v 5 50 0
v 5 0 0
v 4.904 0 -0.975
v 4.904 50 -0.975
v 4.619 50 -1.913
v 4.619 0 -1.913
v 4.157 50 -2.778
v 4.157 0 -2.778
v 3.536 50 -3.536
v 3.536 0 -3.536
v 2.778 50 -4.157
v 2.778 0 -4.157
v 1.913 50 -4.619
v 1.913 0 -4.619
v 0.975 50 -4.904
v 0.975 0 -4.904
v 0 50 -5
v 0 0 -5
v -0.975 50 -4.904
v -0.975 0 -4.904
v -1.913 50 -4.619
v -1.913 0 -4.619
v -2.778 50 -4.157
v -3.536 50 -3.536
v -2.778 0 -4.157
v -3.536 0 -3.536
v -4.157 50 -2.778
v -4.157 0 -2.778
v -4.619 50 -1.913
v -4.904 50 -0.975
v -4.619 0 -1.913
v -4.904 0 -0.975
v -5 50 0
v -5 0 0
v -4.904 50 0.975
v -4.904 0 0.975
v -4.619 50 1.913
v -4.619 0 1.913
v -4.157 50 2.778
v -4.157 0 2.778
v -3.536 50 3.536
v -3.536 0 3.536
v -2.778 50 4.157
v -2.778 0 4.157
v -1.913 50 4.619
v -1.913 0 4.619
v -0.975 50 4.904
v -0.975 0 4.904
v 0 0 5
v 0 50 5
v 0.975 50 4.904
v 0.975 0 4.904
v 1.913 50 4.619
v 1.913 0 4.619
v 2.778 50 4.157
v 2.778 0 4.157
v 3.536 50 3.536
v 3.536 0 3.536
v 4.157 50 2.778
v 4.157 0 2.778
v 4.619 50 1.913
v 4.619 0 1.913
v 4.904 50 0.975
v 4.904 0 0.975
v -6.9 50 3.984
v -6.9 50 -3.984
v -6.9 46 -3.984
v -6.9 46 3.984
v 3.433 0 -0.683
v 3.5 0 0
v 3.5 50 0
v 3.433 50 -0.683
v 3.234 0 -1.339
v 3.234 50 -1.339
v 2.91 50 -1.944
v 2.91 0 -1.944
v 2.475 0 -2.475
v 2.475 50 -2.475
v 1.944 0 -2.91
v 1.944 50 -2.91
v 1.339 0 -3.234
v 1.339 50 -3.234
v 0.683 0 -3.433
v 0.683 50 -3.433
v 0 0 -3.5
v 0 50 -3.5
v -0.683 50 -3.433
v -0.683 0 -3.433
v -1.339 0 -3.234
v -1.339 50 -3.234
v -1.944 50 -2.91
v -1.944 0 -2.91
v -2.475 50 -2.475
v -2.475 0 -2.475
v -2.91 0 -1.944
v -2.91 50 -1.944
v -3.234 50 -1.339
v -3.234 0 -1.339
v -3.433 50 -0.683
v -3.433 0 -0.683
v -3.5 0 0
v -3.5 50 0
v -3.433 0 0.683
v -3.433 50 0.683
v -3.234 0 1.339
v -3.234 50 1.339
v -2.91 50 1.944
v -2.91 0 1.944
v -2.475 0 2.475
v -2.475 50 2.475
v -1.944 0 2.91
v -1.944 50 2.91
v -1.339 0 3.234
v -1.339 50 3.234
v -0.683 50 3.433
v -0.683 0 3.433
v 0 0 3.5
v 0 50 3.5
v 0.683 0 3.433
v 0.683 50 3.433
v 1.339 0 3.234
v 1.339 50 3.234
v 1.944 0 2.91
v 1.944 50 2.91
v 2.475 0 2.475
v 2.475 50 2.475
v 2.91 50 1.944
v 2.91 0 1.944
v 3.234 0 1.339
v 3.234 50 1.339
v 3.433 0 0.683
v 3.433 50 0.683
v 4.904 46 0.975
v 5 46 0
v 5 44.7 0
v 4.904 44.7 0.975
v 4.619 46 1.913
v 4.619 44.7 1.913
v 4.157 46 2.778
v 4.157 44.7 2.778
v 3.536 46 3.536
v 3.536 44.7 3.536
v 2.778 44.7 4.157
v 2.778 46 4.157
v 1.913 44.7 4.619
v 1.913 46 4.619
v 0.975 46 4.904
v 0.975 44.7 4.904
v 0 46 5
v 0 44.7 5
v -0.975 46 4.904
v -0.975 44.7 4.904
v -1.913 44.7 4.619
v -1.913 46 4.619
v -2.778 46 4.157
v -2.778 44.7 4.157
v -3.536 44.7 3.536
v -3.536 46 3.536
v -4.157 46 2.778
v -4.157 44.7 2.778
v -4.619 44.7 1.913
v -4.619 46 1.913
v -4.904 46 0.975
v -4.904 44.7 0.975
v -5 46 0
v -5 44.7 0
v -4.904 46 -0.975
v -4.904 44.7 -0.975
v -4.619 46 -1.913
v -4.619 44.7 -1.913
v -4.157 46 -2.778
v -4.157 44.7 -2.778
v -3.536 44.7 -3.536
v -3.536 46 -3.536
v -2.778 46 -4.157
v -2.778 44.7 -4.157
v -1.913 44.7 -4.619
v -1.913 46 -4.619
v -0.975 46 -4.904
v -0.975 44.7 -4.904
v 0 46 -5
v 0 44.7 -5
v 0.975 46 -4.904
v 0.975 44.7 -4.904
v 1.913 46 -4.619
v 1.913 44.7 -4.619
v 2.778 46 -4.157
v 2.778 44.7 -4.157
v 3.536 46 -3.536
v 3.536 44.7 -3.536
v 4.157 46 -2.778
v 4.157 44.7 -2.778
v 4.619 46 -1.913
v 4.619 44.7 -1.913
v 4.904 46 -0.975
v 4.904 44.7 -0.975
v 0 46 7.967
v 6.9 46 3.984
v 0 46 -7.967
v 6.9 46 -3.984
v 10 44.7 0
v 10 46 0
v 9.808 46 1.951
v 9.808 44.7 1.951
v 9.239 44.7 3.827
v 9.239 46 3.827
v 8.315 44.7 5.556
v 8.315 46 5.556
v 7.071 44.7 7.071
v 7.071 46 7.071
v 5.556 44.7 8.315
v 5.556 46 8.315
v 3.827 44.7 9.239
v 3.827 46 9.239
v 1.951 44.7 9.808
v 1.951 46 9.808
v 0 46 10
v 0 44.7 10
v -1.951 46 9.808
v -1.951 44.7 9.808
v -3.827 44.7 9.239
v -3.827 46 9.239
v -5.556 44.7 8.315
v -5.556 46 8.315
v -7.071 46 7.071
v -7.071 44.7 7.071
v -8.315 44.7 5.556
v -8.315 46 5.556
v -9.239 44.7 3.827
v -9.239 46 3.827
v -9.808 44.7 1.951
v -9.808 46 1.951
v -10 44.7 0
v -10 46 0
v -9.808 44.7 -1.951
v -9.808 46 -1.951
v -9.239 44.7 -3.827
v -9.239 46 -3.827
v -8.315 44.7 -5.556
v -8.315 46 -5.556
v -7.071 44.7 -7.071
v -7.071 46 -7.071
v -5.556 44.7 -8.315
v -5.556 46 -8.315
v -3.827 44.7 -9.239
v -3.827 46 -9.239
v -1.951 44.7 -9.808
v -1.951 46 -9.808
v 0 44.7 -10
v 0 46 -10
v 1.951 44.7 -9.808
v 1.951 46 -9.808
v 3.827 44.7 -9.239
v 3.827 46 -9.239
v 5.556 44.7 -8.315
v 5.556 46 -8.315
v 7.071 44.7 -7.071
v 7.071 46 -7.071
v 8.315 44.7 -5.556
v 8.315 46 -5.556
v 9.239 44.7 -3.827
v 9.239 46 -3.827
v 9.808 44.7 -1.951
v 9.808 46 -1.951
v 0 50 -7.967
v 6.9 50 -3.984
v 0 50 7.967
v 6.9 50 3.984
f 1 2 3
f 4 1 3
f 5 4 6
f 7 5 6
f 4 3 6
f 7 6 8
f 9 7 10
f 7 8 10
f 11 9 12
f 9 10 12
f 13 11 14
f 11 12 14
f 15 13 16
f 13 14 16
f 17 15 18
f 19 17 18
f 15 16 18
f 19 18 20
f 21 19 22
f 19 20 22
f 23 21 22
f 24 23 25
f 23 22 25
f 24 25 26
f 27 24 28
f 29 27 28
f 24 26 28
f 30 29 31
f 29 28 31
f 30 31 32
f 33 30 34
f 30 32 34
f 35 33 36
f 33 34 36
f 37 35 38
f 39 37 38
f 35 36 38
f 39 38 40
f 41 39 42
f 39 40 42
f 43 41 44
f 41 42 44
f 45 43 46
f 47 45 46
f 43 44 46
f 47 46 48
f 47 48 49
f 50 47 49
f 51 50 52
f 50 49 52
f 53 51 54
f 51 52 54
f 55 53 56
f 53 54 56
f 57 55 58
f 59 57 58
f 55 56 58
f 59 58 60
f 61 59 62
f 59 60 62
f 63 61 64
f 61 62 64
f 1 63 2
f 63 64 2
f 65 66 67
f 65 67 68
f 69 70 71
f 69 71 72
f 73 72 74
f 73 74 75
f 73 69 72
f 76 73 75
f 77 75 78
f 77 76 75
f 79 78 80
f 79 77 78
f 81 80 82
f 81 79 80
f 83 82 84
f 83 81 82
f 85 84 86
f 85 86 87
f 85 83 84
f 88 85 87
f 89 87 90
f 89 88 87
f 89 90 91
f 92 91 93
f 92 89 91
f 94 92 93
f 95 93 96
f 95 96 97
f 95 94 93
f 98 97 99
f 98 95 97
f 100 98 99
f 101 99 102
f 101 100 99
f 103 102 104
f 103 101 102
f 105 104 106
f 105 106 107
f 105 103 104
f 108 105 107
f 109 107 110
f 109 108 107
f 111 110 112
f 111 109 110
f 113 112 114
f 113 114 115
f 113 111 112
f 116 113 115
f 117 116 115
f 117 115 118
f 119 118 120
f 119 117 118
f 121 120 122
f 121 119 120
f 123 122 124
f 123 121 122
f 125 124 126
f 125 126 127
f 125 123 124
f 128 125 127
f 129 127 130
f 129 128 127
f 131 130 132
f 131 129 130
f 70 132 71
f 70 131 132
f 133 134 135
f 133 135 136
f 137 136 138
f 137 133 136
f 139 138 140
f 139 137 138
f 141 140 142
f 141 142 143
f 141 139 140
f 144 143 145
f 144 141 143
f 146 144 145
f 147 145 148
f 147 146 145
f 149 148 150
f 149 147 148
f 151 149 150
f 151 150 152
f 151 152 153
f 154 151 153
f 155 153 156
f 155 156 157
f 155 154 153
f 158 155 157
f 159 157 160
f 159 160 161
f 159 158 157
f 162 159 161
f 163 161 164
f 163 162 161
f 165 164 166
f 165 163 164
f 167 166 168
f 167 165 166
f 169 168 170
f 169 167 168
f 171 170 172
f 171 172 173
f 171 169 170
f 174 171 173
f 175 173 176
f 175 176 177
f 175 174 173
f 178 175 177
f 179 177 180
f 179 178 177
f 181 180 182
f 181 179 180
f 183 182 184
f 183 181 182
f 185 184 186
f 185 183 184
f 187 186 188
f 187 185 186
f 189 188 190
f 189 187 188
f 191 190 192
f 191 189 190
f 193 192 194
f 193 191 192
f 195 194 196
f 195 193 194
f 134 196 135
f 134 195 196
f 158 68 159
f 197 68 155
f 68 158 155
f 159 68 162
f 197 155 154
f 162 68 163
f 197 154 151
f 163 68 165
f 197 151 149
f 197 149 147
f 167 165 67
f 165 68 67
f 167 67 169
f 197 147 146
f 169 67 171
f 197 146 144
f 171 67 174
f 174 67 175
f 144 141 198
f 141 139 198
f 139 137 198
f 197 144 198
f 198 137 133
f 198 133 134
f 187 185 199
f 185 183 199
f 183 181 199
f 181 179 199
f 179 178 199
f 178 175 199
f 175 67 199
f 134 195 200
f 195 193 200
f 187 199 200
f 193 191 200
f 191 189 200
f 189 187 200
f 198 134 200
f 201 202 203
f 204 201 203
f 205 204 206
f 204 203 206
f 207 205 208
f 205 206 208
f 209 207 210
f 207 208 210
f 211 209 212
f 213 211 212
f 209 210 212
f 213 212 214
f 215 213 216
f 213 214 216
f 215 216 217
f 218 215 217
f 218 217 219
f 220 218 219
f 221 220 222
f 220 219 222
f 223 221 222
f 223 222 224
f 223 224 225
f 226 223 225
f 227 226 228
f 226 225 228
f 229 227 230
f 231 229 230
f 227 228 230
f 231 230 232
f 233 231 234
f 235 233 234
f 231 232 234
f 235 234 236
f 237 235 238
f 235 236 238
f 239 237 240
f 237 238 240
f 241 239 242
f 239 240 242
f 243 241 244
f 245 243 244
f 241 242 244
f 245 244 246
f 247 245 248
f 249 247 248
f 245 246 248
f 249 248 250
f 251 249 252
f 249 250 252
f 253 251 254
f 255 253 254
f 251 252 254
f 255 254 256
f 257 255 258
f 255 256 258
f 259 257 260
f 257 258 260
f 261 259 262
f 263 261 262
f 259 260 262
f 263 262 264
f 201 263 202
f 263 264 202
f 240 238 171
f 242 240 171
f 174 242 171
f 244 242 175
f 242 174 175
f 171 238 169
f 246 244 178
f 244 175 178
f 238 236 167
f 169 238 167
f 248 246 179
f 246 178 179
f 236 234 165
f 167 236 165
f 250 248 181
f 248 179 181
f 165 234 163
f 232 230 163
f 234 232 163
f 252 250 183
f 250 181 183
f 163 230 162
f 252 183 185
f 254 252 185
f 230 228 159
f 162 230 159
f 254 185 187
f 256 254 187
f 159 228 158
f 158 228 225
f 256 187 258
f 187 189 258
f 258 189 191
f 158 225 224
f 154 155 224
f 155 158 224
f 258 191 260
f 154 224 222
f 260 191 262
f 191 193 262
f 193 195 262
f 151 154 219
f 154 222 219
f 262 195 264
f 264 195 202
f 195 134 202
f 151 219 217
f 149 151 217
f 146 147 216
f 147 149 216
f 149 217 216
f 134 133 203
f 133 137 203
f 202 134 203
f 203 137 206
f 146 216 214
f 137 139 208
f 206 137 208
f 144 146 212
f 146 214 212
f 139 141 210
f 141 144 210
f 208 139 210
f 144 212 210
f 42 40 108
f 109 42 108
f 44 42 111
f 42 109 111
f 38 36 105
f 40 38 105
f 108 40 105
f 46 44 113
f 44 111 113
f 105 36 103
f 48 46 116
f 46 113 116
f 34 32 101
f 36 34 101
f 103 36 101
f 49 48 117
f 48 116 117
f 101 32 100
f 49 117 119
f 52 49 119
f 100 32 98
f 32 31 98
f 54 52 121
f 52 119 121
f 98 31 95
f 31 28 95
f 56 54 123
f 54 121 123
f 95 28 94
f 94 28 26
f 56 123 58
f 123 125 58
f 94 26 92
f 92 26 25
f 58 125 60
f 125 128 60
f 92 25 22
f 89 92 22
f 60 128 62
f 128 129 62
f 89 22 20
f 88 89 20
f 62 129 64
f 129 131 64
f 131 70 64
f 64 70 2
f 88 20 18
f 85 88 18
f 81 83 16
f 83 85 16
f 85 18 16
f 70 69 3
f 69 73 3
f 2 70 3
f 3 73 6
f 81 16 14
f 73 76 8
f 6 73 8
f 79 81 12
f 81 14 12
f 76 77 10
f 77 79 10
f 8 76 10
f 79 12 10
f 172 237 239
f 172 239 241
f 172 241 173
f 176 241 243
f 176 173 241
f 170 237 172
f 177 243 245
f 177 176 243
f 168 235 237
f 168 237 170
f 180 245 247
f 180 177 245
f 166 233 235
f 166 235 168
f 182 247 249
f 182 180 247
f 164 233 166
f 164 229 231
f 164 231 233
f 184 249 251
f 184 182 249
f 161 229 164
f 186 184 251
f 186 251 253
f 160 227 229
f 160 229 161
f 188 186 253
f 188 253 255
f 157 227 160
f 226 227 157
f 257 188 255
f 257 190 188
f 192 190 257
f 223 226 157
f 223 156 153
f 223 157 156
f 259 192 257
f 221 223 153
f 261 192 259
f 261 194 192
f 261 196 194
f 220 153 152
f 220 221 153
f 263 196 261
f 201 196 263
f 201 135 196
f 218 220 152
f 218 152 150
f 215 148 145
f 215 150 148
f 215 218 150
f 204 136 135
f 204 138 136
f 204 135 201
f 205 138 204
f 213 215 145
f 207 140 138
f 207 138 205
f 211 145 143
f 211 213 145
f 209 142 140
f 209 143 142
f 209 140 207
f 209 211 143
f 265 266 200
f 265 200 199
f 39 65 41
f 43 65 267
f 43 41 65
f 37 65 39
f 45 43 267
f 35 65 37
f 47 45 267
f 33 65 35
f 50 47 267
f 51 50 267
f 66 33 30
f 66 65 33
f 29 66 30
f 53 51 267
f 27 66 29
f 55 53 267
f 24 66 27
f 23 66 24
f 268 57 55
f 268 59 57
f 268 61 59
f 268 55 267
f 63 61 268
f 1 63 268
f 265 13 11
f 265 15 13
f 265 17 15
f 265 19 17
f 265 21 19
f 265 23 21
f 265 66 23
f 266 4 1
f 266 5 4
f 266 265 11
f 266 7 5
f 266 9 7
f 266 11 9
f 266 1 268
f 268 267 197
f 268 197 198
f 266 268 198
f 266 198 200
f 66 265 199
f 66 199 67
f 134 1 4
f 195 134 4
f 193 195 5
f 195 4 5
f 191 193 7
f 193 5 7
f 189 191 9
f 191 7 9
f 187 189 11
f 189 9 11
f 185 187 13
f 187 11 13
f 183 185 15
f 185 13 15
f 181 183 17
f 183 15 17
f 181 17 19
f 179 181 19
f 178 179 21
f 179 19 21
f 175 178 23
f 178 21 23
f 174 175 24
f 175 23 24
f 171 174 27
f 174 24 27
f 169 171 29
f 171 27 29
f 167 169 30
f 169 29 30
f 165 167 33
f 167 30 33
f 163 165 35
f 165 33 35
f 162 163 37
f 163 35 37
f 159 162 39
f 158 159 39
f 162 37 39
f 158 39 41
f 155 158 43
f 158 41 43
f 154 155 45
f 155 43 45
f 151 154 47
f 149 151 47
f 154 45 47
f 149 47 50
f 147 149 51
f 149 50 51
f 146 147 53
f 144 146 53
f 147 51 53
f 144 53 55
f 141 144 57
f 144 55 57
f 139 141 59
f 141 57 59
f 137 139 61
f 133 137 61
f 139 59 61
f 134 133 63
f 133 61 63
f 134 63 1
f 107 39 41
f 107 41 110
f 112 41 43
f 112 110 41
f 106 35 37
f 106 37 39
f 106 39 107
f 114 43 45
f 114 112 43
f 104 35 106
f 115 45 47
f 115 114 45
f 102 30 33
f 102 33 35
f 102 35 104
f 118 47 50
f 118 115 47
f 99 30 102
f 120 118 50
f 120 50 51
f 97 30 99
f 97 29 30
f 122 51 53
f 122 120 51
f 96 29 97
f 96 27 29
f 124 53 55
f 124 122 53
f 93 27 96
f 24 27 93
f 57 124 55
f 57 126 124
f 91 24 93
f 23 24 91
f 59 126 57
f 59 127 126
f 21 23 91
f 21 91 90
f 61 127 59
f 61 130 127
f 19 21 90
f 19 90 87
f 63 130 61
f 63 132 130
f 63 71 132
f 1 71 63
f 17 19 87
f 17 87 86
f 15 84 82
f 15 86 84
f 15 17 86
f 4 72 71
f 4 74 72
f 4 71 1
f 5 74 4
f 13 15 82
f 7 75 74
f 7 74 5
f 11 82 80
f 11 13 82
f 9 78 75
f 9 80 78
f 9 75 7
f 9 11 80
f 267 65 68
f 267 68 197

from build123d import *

# Parameters (mm, degrees)
SKETCH1_R           = 5
SKETCH1_R_2         = 3.5
BOSS_EXTRUDE1_DEPTH = 50
SKETCH2_R           = 5
BOSS_EXTRUDE2_DEPTH = 4
SKETCH3_R           = 10
SKETCH3_R_2         = 5
BOSS_EXTRUDE3_DEPTH = 1.3


with BuildPart() as part:
    # Sketch1 → Boss-Extrude1 (new body)
    with BuildSketch(Plane(origin=(0, 0, 0), x_dir=(1, 0, 0), z_dir=(0, 1, 0))):
        Circle(SKETCH1_R)
        Circle(SKETCH1_R_2, mode=Mode.SUBTRACT)
    extrude(amount=BOSS_EXTRUDE1_DEPTH)


with BuildPart() as body_2:
    # Sketch2 → Boss-Extrude2 (new body)
    with BuildSketch(Plane(origin=(0, 50, 0), x_dir=(1, 0, 0), z_dir=(0, 1, 0))):
        Polygon((0, 7.967433715), (-6.9, 3.983716857), (-6.9, -3.983716857), (0, -7.967433715), (6.9, -3.983716857), (6.9, 3.983716857), align=None)
        Circle(SKETCH2_R, mode=Mode.SUBTRACT)
    extrude(amount=-BOSS_EXTRUDE2_DEPTH)


with BuildPart() as body_3:
    # Sketch3 → Boss-Extrude3 (new body)
    with BuildSketch(Plane.XZ.offset(-46)):
        Circle(SKETCH3_R)
        Circle(SKETCH3_R_2, mode=Mode.SUBTRACT)
    extrude(amount=BOSS_EXTRUDE3_DEPTH)


solid = Compound([part.part, body_2.part, body_3.part])
